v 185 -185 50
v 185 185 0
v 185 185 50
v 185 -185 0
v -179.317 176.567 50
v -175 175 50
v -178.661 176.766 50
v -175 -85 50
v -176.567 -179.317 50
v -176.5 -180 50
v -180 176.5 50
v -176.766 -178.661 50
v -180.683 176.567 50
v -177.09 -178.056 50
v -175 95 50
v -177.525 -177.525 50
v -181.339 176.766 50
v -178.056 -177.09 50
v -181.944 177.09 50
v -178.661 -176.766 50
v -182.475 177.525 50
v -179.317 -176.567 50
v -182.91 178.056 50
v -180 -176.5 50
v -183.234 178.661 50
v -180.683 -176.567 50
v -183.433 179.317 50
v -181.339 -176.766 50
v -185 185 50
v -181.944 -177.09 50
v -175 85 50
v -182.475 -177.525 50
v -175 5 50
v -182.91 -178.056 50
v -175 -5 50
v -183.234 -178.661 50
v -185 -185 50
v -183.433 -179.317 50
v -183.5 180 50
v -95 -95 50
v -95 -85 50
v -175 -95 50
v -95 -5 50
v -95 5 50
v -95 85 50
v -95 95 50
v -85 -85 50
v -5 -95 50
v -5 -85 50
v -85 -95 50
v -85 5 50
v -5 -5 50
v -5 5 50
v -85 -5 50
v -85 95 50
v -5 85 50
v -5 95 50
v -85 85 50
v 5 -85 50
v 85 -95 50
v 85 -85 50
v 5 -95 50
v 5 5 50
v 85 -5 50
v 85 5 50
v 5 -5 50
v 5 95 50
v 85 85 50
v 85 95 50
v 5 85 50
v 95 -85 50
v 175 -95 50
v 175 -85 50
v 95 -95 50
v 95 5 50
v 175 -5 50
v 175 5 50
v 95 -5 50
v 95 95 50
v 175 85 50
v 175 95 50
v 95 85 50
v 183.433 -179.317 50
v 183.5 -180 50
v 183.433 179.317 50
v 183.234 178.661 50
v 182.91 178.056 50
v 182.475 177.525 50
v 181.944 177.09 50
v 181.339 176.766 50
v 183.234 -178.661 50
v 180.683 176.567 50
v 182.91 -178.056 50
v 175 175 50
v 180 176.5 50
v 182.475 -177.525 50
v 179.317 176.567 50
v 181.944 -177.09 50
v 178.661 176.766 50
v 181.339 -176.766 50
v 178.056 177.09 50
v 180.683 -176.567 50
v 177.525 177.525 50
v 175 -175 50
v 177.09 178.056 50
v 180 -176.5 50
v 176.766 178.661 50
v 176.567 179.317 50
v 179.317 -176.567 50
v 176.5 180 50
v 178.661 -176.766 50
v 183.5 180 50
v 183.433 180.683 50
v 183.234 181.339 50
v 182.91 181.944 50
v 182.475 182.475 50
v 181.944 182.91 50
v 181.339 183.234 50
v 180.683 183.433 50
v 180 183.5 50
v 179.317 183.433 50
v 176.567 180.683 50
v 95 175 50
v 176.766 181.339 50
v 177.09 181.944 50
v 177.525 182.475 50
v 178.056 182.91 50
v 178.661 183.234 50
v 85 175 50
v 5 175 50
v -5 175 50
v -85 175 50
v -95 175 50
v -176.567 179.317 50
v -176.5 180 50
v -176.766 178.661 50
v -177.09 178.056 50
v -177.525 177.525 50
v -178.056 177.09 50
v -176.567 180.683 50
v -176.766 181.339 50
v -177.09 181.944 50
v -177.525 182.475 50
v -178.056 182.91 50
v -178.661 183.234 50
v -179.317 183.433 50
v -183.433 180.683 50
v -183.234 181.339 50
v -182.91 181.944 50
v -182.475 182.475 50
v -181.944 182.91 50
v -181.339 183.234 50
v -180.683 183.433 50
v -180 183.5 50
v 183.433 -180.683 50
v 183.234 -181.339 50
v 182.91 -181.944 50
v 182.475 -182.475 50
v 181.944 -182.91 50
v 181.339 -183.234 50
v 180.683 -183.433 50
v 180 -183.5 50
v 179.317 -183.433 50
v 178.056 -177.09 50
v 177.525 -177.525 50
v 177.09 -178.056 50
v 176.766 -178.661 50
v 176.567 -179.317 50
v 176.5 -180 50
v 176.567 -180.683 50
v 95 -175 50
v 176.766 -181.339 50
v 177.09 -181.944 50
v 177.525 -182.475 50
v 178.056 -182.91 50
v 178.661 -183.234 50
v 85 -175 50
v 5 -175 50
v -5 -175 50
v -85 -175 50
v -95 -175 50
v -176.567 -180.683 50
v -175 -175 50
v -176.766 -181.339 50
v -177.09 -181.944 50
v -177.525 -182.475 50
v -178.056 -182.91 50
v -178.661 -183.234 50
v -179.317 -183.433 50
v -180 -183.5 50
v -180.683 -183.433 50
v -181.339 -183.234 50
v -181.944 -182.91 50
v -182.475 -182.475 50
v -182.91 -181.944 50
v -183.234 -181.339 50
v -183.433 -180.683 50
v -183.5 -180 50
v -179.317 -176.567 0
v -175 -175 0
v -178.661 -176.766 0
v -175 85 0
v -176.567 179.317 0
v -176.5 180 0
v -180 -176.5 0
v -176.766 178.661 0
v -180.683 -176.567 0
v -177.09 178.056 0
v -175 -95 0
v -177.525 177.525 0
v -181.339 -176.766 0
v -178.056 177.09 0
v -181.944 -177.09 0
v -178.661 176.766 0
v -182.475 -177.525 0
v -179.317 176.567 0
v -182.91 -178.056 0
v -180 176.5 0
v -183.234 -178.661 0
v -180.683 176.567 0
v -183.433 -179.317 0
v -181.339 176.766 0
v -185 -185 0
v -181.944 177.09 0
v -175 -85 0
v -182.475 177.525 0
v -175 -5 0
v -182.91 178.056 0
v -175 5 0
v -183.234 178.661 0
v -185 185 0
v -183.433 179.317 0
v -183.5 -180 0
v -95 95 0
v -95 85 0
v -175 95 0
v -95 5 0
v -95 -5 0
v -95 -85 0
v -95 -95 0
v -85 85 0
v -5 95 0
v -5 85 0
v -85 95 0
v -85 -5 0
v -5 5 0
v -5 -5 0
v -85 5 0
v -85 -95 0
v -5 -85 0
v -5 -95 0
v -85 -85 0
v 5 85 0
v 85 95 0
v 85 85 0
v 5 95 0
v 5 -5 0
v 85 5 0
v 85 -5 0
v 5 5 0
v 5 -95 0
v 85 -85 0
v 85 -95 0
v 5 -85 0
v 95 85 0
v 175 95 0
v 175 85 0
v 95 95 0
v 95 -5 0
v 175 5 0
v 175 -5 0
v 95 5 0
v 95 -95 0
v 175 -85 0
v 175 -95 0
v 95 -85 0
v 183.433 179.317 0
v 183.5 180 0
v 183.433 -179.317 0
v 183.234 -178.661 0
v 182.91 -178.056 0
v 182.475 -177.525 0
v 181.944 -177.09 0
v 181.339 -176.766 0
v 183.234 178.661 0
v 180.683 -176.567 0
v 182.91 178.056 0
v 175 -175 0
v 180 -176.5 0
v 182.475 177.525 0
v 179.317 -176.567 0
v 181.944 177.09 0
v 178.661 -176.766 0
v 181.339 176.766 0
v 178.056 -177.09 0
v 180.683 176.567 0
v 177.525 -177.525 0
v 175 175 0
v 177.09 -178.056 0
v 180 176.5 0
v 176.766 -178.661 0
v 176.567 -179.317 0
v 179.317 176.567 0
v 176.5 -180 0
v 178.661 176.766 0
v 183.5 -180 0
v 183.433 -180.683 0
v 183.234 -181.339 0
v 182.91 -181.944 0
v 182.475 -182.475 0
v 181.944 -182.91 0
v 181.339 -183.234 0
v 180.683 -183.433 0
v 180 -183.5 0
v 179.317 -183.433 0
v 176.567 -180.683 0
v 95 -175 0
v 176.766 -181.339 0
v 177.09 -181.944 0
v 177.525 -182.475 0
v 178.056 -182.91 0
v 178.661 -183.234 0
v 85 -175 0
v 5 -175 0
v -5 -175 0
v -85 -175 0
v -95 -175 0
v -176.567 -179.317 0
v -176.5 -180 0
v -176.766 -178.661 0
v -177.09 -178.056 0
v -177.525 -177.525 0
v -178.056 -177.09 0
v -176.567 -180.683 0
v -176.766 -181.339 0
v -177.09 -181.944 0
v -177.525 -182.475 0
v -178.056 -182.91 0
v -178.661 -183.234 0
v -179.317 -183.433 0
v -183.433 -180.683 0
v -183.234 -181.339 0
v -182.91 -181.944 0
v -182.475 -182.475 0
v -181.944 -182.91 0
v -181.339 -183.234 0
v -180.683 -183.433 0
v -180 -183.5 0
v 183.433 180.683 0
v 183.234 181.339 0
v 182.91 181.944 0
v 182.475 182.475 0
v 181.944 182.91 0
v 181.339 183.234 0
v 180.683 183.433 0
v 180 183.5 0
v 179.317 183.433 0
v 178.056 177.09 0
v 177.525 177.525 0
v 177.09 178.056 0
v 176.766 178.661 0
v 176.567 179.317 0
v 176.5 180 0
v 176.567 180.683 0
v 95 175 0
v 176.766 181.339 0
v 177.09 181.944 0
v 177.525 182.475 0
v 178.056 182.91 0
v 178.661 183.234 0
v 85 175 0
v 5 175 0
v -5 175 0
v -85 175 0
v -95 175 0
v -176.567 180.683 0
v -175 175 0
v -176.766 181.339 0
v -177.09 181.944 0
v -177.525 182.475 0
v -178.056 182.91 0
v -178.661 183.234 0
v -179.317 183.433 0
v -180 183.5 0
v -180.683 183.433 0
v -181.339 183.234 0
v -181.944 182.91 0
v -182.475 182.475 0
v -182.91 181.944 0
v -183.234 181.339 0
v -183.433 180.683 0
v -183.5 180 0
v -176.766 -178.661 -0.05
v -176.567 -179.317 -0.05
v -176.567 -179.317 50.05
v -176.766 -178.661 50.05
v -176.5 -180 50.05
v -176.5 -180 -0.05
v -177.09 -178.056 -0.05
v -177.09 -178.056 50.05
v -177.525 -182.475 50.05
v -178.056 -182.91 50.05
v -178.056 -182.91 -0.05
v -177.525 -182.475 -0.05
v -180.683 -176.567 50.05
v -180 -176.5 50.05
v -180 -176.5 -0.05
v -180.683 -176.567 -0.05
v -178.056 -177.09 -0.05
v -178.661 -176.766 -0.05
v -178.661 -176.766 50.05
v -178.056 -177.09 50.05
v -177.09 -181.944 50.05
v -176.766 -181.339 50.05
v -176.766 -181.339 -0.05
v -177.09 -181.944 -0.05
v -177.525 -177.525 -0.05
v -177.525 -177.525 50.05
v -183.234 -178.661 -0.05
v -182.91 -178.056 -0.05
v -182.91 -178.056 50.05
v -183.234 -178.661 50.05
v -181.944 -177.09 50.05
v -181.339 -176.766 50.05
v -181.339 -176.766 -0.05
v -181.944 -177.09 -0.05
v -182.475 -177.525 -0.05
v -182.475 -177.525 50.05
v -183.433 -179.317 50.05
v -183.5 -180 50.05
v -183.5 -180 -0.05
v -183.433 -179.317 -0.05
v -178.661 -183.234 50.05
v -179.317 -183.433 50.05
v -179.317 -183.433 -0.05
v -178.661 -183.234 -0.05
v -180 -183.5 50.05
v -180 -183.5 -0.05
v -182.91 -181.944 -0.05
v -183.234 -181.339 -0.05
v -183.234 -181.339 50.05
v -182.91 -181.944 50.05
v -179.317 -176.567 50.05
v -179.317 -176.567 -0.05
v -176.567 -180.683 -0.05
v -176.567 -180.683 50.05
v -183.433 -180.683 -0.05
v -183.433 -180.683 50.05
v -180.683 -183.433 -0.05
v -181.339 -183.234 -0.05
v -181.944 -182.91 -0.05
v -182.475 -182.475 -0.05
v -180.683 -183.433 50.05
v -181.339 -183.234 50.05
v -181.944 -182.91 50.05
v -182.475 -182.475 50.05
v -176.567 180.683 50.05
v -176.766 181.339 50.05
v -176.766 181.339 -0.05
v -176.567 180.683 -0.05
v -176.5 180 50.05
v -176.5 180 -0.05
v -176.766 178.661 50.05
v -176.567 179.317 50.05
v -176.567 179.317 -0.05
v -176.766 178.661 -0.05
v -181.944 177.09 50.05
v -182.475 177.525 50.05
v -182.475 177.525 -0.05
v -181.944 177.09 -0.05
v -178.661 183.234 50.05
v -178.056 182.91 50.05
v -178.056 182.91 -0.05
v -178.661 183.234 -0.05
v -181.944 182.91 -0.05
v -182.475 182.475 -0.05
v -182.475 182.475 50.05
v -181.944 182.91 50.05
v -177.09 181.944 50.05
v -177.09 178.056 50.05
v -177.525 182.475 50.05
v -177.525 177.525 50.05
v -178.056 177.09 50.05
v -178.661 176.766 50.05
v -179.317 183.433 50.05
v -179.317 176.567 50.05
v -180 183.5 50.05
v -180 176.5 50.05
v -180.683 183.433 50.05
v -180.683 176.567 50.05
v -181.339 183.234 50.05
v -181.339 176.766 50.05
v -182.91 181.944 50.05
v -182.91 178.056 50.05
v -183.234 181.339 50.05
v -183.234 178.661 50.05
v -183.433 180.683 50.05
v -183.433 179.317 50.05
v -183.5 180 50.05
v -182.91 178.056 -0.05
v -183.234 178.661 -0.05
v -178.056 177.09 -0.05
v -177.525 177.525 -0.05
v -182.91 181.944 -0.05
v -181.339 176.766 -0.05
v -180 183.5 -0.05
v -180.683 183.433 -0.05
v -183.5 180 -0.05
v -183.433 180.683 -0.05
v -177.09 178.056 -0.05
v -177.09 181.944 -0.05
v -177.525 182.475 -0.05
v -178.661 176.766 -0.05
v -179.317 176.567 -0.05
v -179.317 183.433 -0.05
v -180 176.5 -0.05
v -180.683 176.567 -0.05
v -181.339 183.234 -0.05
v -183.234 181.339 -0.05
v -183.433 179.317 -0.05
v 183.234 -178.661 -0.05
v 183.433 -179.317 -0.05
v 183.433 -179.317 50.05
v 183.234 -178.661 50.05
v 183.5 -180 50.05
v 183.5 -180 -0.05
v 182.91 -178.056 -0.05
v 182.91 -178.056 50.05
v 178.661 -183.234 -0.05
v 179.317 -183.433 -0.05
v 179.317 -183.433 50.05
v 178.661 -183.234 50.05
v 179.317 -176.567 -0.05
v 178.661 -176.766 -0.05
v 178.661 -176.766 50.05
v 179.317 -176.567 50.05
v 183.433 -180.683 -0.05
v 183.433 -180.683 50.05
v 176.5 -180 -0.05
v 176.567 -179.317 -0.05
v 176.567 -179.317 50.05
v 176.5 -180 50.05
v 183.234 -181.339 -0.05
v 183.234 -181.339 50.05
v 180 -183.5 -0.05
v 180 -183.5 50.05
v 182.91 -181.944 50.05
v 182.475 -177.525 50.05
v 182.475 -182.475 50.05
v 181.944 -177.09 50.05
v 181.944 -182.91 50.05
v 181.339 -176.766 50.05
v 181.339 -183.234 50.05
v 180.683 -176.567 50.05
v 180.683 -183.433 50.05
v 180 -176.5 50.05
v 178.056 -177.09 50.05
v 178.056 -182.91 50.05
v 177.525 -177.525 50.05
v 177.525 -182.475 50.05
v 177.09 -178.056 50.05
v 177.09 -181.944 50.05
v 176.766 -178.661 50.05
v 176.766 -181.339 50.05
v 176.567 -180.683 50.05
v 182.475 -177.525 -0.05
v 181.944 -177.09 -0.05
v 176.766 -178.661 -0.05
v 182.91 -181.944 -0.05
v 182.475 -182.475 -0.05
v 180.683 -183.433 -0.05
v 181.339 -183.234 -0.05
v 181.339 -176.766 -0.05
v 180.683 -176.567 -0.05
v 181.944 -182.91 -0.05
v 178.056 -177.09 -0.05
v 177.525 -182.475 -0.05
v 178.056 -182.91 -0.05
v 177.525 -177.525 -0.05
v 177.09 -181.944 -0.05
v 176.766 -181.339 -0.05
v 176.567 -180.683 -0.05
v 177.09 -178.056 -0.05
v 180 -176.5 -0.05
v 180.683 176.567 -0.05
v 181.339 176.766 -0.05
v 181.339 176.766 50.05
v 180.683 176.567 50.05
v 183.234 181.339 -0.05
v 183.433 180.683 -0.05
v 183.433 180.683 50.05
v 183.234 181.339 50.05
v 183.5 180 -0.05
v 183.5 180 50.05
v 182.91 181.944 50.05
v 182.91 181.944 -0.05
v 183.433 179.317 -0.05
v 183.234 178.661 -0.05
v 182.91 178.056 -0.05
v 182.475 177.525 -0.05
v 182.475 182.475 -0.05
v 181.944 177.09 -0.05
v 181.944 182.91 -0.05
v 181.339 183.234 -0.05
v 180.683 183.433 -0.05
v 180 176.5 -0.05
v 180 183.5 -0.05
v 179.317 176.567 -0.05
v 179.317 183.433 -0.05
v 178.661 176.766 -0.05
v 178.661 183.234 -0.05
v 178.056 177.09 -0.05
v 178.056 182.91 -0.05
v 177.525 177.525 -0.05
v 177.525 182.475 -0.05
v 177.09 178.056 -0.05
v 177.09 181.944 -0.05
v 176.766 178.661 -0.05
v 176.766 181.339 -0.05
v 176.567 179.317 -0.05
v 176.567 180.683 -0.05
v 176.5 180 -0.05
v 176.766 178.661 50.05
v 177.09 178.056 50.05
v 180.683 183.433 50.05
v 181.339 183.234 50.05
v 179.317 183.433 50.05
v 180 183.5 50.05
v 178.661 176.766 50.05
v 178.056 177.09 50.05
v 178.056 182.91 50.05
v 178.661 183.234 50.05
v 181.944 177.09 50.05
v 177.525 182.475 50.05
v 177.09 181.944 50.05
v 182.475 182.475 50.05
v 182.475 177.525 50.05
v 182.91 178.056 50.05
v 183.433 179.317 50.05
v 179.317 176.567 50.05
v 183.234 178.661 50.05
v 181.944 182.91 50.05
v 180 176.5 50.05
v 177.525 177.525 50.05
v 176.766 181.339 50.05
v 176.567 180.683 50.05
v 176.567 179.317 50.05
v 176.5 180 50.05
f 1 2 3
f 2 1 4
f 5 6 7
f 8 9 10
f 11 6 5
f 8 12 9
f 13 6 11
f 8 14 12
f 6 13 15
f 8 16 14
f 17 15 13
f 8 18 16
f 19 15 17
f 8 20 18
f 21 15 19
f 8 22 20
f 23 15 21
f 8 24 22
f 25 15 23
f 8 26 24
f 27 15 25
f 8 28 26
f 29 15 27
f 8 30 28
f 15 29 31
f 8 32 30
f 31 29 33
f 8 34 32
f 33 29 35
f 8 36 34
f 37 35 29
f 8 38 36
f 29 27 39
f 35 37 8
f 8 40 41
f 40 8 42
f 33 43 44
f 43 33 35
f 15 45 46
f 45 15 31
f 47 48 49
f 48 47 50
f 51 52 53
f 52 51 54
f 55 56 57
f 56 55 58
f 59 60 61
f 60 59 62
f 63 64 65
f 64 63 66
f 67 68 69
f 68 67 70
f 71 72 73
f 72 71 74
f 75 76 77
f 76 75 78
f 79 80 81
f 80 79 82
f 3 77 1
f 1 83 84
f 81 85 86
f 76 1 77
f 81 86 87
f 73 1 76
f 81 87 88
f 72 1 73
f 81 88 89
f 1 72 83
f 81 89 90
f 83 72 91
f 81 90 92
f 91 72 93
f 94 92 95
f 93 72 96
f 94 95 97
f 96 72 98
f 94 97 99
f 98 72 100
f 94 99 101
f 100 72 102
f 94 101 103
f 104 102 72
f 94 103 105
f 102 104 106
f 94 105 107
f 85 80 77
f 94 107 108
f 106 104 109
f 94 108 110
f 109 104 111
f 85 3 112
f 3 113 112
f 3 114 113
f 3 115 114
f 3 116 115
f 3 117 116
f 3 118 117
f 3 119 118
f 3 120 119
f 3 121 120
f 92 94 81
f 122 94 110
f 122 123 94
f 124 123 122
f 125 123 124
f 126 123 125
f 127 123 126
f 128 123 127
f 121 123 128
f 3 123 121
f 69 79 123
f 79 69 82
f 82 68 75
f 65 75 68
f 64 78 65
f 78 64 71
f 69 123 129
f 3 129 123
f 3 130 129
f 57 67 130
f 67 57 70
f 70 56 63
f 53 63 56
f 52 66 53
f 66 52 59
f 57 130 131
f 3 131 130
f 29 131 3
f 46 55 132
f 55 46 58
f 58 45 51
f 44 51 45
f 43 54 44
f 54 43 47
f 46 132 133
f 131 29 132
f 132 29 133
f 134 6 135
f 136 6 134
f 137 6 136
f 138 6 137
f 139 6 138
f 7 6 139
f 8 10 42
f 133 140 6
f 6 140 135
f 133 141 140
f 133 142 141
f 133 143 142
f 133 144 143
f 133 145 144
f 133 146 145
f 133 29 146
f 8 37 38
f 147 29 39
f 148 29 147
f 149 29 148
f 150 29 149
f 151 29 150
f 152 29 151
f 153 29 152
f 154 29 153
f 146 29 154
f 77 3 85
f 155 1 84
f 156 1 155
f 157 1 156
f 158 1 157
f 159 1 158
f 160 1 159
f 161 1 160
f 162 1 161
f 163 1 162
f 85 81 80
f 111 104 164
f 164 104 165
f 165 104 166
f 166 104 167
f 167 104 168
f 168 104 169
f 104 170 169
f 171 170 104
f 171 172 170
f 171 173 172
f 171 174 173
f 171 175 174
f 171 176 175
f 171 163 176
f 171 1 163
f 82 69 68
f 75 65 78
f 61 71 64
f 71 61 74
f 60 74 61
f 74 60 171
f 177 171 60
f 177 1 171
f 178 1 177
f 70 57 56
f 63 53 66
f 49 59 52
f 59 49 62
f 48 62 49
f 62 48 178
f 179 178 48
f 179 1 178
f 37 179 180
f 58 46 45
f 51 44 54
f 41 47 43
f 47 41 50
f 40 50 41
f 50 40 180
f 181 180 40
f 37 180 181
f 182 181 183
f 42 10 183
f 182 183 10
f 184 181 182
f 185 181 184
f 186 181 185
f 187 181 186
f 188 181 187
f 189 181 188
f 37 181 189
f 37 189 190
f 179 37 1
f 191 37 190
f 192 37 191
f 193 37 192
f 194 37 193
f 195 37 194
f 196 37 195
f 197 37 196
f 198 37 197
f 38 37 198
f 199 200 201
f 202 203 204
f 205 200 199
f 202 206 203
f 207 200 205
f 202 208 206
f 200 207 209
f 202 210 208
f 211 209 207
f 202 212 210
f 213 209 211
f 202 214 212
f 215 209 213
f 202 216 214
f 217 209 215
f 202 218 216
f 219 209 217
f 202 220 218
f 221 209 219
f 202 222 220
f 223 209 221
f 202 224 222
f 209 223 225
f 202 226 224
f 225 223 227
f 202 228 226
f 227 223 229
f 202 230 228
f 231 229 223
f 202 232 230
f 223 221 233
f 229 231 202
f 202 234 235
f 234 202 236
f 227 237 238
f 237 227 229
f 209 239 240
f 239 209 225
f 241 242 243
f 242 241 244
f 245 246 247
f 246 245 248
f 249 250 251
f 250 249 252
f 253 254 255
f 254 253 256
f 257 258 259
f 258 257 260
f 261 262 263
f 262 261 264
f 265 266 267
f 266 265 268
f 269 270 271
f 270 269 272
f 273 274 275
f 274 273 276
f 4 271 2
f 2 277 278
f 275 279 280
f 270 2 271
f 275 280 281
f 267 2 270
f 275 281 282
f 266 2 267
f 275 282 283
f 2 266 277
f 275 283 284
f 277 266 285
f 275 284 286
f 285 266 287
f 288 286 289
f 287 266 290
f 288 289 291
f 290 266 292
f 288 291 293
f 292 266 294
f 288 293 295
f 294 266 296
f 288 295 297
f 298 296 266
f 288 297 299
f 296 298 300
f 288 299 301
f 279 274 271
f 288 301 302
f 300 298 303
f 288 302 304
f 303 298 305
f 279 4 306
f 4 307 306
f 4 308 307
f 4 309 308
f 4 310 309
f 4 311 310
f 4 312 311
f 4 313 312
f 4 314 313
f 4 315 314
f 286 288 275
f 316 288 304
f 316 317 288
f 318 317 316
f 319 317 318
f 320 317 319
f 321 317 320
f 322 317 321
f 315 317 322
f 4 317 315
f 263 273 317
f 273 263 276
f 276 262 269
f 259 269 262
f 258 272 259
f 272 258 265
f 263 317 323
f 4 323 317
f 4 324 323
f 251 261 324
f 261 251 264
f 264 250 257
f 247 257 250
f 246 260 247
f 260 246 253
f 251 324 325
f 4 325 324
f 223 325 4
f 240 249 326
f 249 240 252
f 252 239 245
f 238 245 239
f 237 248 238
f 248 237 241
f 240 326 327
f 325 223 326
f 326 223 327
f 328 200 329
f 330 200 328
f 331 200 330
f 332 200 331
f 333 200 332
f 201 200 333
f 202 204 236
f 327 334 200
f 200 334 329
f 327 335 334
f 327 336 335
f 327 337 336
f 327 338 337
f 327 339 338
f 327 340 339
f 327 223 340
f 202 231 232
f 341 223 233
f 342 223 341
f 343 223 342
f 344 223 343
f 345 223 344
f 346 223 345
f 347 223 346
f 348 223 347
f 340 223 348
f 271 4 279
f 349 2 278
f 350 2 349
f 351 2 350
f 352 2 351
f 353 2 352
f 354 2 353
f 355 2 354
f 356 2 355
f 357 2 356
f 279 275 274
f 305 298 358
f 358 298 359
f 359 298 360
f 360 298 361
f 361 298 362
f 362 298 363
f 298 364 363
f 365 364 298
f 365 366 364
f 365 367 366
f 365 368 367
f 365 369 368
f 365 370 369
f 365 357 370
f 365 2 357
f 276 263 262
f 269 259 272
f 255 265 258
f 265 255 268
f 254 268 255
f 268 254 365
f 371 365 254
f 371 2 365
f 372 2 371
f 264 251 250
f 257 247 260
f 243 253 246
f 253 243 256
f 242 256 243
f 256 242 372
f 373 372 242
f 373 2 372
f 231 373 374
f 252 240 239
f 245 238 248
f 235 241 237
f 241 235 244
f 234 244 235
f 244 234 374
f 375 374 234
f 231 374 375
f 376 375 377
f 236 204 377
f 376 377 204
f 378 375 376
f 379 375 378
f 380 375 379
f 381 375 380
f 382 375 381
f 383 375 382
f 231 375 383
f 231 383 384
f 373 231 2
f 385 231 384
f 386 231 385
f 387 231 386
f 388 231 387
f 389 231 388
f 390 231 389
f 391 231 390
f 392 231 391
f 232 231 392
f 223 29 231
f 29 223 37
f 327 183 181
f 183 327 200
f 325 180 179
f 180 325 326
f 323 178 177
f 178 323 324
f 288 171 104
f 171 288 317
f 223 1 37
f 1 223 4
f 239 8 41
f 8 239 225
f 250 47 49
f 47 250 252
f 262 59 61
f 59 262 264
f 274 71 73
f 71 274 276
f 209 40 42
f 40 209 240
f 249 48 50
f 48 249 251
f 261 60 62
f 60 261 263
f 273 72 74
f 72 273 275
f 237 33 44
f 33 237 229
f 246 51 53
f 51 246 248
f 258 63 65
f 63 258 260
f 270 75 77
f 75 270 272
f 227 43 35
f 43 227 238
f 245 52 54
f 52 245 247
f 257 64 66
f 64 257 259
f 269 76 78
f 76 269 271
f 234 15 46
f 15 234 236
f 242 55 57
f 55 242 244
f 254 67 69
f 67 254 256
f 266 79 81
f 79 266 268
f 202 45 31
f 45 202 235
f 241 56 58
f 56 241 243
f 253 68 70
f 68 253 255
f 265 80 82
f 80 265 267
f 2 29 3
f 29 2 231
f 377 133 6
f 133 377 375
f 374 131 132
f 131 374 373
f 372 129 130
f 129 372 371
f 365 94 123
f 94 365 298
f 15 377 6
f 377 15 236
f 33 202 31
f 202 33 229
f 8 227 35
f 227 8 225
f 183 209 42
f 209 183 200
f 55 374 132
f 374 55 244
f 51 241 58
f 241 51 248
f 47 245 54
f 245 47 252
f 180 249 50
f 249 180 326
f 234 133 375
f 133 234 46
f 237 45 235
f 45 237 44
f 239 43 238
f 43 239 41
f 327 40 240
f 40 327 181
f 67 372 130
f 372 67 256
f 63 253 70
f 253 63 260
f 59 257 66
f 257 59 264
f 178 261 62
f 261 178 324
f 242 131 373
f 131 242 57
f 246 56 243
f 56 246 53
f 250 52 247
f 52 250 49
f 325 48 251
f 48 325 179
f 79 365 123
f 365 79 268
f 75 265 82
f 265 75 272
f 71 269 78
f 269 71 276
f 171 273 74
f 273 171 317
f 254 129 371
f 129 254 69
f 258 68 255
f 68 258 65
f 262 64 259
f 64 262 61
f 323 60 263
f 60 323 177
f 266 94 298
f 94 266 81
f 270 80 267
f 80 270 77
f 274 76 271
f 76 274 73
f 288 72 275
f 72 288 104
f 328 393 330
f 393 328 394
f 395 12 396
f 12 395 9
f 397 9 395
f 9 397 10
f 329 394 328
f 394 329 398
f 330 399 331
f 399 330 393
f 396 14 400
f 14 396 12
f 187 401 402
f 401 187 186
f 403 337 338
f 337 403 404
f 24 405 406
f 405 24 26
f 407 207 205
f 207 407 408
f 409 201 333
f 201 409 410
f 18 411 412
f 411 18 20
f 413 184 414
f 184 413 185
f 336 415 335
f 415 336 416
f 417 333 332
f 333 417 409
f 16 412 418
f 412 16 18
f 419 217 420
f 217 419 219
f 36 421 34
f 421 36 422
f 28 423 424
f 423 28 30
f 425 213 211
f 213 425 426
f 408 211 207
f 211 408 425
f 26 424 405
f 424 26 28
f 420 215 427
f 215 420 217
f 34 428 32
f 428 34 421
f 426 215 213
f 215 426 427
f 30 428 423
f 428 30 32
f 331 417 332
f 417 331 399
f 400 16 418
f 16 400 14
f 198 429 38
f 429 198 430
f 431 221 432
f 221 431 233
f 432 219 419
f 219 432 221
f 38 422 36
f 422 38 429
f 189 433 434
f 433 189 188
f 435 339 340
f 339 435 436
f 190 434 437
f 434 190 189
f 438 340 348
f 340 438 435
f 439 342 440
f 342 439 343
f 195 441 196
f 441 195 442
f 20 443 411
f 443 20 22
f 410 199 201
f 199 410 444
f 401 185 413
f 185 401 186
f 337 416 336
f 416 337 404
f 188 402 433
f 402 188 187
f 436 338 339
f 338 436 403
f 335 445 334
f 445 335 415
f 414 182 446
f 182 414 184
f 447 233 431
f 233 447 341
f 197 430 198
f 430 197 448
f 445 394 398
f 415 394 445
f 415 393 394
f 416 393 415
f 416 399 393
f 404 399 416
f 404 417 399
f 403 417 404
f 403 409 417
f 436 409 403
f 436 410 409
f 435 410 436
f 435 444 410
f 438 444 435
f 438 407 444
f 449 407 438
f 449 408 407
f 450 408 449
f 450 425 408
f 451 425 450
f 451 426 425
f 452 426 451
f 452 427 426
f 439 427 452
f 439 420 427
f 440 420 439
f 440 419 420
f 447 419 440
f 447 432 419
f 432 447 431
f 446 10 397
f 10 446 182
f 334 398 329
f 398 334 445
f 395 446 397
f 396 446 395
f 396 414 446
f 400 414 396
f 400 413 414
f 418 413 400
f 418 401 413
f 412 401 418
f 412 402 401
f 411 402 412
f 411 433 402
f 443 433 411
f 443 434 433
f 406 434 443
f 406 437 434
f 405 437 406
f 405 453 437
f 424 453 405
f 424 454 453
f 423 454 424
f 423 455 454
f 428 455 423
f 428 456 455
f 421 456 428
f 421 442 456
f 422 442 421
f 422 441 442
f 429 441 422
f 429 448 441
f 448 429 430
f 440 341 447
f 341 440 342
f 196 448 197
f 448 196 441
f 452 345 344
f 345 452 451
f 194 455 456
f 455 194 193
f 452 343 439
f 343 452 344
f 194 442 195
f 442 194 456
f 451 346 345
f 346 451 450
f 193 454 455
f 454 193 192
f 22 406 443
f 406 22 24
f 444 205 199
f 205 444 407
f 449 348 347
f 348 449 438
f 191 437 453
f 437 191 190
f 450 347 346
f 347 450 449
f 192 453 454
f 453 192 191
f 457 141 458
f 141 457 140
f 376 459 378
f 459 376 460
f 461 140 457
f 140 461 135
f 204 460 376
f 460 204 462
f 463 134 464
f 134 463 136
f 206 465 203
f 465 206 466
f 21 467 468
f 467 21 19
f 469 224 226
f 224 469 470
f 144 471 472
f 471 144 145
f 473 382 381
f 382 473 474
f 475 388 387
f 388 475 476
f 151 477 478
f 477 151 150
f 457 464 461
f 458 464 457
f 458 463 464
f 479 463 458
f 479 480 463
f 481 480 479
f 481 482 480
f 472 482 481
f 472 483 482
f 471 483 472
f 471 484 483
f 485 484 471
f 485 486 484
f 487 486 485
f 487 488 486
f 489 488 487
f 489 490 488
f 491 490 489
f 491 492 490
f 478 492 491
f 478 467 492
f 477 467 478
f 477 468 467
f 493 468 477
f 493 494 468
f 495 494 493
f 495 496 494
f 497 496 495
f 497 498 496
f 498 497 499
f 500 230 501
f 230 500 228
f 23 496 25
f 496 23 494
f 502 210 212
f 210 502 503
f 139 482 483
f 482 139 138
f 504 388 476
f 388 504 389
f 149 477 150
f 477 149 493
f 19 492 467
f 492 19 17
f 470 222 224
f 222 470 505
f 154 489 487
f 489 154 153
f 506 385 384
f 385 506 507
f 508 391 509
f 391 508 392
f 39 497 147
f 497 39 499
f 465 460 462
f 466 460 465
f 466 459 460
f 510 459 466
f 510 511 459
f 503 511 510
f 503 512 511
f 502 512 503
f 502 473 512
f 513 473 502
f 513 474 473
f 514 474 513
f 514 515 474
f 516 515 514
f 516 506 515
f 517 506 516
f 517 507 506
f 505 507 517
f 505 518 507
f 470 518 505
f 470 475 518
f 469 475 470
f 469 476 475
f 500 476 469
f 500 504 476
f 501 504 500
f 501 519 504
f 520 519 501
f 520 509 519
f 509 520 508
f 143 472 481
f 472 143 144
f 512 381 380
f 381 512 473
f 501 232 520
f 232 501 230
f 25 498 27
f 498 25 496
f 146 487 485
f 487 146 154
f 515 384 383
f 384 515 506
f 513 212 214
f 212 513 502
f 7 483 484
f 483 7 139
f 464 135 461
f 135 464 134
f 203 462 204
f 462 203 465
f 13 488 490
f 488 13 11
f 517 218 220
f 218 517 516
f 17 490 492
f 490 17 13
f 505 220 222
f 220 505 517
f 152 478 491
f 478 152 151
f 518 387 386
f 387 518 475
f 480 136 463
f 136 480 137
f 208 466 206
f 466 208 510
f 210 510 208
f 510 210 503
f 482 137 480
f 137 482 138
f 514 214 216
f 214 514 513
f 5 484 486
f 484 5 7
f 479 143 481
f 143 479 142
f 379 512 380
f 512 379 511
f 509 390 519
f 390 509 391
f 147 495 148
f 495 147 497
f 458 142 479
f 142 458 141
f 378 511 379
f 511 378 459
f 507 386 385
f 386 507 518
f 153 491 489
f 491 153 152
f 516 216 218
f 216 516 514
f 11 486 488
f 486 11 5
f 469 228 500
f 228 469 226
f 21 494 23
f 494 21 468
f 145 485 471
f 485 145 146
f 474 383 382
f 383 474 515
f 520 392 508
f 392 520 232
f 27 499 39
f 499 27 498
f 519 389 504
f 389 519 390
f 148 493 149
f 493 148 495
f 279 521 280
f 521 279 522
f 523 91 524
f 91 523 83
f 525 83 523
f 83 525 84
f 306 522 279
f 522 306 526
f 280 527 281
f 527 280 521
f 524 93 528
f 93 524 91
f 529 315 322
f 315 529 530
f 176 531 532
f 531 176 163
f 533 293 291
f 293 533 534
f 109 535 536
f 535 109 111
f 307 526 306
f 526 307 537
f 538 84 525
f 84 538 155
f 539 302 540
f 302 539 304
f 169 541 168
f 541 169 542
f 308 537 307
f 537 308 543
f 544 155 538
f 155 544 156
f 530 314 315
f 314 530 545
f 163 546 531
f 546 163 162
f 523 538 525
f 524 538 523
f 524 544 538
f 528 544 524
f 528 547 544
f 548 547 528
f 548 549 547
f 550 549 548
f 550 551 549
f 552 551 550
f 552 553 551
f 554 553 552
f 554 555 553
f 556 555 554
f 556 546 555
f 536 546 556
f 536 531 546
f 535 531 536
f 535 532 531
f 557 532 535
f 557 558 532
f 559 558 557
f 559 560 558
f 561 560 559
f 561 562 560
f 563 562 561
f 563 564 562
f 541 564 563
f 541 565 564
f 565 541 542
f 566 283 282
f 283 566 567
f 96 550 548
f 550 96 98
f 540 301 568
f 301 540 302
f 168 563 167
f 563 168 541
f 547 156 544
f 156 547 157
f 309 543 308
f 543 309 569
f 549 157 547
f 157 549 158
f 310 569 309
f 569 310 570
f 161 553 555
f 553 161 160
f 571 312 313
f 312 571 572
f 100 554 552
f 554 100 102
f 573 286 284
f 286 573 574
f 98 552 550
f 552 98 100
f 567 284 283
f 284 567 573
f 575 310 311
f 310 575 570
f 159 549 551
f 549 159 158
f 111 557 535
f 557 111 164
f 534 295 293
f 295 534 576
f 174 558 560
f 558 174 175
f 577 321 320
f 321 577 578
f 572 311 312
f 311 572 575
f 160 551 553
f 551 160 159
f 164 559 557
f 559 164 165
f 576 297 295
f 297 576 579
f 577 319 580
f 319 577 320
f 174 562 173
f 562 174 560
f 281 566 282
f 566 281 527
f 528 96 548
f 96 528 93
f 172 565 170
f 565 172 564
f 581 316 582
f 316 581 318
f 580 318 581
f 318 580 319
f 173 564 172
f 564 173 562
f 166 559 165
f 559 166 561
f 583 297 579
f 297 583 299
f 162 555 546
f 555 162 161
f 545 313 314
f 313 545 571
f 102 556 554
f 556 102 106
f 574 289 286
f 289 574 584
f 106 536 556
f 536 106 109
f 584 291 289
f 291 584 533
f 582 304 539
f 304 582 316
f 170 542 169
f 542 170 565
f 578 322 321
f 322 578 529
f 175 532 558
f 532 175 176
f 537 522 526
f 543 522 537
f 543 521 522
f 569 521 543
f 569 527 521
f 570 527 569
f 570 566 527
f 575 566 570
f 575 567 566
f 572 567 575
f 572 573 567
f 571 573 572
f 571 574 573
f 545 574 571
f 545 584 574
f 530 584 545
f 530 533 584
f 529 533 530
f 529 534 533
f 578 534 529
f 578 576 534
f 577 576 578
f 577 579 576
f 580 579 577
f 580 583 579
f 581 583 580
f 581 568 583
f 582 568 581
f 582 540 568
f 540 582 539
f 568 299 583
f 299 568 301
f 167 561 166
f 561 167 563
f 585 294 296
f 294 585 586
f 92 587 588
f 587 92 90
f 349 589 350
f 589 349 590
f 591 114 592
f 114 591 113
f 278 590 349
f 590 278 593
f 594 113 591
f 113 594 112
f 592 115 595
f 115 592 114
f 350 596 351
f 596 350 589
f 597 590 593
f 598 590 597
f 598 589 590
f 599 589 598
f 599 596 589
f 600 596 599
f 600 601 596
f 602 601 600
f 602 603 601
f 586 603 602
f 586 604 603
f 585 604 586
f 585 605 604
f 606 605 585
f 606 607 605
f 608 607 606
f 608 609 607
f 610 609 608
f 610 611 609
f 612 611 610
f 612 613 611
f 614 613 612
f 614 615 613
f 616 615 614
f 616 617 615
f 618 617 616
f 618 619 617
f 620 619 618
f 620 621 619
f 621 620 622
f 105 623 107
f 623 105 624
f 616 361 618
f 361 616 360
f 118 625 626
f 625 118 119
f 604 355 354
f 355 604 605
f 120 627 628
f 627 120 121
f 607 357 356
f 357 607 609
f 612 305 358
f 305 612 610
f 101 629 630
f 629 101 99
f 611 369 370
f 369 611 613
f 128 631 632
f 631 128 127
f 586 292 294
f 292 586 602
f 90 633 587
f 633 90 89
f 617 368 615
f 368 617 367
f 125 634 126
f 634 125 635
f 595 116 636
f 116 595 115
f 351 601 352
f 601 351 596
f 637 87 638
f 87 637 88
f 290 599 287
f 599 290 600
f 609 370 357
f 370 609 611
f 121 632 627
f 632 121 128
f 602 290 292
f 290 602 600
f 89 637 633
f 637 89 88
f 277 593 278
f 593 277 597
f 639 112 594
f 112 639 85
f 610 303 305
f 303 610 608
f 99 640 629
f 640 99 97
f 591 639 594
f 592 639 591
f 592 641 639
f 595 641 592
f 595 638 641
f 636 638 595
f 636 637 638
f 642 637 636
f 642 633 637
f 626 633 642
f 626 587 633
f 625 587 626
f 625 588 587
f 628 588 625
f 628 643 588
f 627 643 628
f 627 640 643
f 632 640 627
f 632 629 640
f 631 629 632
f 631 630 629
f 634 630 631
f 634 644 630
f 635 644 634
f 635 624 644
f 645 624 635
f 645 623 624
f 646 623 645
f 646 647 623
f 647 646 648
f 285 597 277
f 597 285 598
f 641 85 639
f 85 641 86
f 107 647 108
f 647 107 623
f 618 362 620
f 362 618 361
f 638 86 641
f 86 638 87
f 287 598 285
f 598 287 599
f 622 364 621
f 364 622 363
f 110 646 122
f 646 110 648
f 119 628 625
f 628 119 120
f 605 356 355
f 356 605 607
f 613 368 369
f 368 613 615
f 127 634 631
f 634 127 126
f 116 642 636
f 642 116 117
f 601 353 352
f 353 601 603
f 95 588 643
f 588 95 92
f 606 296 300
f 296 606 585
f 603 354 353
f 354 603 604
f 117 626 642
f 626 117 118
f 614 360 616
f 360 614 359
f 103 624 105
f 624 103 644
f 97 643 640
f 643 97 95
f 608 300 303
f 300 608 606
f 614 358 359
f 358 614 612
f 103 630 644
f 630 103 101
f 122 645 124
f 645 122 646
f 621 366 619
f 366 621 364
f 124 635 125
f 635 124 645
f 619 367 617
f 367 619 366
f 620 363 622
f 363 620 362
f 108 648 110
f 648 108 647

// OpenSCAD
// Part Name: Cage_Layer_13_H50mm
// This part represents a horizontal slice of the cage.
// It is designed to be 3D printed on its base.

// Parameters for the cage
bar_t = 10;
gap_xy = 80;
hole_d = 7;
cage_ext_xy = 370;

// Calculate bar center positions relative to the overall cage center
bar_centers_xy = [for (j = [0:4]) (-cage_ext_xy/2 + bar_t/2 + j * (bar_t + gap_xy))];

// Module to generate a single layer segment
module cage_layer_segment(height) {
    // Offset for printing on z=0 plane. The module itself is centered on XY=0, so this Z offset moves its base to Z=0.
    translate([0, 0, height/2]) {
        union() {
            // Horizontal bars (along X)
            for (y_center = bar_centers_xy) {
                translate([0, y_center, 0])
                cube([cage_ext_xy, bar_t, height], center = true);
            }

            // Vertical bars (along Y)
            for (x_center = bar_centers_xy) {
                translate([x_center, 0, 0])
                cube([bar_t, cage_ext_xy, height], center = true);
            }

            // Subtract holes for M6 rods at the 4 corners
            corner_offsets_xy = [bar_centers_xy[0], bar_centers_xy[4]];

            for (x_offset = corner_offsets_xy) {
                for (y_offset = corner_offsets_xy) {
                    // Hole through the center of the corner bar
                    translate([x_offset, y_offset, 0])
                    cylinder(h = height + 0.1, d = hole_d, center = true, $fn=32); // +0.1 for clean cut
                }
            }
        }
    }
}

// Render the segment
cage_layer_segment(50);
